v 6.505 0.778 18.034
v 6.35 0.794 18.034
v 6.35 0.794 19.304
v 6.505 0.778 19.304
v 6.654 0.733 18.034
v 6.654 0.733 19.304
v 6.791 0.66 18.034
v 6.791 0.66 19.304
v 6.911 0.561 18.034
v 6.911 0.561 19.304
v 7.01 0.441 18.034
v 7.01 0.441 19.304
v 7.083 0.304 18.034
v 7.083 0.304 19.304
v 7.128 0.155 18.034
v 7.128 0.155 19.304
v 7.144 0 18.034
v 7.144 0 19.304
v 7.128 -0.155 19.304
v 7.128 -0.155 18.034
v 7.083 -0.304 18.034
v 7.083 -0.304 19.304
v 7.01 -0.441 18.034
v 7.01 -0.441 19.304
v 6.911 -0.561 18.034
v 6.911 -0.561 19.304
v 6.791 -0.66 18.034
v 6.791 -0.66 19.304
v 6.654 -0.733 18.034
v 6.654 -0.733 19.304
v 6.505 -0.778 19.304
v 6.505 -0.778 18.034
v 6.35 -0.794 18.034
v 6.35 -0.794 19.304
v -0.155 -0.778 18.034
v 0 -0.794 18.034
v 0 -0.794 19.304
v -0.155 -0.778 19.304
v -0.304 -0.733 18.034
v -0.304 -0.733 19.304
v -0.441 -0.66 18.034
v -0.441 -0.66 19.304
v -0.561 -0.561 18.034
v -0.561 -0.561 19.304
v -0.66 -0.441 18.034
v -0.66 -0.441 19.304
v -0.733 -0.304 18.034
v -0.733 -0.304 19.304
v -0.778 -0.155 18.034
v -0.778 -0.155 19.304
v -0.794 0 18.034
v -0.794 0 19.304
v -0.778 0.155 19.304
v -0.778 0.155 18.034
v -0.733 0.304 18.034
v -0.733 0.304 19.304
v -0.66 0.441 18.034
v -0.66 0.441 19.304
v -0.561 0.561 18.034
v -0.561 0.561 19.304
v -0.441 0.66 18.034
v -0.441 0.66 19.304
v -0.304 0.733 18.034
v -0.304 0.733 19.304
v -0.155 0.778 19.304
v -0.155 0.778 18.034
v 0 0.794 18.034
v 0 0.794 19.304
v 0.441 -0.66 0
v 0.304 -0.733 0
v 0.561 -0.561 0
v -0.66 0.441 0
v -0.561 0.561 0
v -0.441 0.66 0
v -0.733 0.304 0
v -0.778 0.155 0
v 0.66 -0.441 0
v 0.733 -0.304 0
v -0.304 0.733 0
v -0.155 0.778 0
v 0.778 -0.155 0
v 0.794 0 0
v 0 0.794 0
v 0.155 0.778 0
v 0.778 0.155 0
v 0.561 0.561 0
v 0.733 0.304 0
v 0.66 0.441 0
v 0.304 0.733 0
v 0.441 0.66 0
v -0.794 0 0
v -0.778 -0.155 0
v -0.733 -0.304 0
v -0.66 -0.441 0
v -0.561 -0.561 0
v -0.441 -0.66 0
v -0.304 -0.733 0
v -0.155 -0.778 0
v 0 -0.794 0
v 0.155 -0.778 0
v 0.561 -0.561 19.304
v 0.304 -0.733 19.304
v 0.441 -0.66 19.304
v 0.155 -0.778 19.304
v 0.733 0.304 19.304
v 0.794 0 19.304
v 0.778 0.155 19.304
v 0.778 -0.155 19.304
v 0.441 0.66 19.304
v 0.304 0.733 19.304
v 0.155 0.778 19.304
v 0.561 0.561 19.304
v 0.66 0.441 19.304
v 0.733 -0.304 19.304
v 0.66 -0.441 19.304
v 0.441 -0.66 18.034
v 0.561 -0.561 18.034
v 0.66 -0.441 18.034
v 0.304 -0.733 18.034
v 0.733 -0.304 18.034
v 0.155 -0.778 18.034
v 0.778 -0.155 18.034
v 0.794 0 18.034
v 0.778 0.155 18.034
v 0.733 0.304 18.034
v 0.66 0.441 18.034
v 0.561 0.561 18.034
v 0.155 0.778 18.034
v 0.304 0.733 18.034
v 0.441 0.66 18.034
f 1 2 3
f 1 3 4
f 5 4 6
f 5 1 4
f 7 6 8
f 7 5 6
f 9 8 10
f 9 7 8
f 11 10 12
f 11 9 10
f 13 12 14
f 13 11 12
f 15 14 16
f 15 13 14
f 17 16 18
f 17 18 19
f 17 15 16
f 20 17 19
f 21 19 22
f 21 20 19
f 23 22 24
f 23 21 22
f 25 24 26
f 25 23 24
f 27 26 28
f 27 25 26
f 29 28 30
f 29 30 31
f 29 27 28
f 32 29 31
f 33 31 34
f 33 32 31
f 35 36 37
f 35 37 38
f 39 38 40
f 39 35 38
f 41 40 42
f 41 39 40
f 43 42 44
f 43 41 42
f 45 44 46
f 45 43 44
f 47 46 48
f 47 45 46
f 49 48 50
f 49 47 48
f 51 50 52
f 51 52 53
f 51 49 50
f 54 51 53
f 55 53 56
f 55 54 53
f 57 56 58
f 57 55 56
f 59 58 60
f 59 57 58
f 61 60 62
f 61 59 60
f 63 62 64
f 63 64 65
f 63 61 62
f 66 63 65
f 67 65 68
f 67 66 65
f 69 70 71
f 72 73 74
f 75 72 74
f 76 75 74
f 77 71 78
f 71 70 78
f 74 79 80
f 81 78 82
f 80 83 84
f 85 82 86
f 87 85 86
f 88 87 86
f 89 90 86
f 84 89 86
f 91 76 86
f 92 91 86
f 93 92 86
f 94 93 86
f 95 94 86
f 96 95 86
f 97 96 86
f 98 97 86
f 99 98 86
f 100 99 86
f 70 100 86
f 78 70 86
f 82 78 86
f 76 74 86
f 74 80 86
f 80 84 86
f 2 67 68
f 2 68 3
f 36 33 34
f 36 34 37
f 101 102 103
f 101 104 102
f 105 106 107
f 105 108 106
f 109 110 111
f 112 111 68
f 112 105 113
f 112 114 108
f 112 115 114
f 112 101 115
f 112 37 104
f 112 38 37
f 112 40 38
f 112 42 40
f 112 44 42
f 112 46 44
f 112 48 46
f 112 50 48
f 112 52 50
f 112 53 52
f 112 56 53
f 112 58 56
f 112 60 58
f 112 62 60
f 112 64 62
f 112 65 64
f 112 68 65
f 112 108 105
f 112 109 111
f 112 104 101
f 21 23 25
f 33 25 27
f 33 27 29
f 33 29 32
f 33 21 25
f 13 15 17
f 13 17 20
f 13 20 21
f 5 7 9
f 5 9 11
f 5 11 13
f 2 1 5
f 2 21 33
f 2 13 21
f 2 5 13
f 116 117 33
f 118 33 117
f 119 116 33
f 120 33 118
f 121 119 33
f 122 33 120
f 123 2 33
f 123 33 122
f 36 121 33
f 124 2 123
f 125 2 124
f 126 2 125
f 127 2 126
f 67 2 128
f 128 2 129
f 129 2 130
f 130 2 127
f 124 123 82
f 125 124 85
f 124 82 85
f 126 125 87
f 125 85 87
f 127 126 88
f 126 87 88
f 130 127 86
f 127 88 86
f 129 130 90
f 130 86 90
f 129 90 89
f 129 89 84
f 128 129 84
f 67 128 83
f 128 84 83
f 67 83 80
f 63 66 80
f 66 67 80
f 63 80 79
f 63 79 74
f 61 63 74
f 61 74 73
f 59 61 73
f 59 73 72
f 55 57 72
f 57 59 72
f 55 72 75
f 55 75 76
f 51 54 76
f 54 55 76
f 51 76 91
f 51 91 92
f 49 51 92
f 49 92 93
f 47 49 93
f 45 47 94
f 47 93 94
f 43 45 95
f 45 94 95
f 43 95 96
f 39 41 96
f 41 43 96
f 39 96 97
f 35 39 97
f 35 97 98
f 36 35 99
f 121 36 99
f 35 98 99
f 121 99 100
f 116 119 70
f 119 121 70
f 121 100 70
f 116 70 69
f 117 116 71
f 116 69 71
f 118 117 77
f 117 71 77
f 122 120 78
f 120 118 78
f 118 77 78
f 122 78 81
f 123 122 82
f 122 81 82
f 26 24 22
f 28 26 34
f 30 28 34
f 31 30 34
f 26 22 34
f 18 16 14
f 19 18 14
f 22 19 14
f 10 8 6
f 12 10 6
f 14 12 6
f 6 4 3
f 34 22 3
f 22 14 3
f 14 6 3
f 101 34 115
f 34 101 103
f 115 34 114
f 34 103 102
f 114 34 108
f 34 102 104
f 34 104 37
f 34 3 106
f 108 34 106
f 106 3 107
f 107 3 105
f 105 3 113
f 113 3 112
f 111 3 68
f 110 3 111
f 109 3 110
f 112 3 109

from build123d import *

# Parameters (mm, degrees)
SKETCH1_R           = 0.79375
BOSS_EXTRUDE1_DEPTH = 19.304
BOSS_EXTRUDE5_START = -1.27
BOSS_EXTRUDE5_DEPTH = 1.27


with BuildPart() as part:
    # Sketch1 → Boss-Extrude1 (new body)
    with BuildSketch(Plane.XY):
        Circle(SKETCH1_R)
    extrude(amount=BOSS_EXTRUDE1_DEPTH)

    # Sketch3 → Boss-Extrude5 (add)
    with BuildSketch(Plane.XY.offset(19.304).offset(BOSS_EXTRUDE5_START)):
        with BuildLine():
            Line((0, 0.79375), (6.35, 0.79375))
            ThreePointArc((6.35, 0.79375), (7.14375, 0), (6.35, -0.79375))
            Line((6.35, -0.79375), (0, -0.79375))
            ThreePointArc((0, -0.79375), (-0.79375, 0), (0, 0.79375))
        make_face()
    extrude(amount=BOSS_EXTRUDE5_DEPTH)


solid = part.part
